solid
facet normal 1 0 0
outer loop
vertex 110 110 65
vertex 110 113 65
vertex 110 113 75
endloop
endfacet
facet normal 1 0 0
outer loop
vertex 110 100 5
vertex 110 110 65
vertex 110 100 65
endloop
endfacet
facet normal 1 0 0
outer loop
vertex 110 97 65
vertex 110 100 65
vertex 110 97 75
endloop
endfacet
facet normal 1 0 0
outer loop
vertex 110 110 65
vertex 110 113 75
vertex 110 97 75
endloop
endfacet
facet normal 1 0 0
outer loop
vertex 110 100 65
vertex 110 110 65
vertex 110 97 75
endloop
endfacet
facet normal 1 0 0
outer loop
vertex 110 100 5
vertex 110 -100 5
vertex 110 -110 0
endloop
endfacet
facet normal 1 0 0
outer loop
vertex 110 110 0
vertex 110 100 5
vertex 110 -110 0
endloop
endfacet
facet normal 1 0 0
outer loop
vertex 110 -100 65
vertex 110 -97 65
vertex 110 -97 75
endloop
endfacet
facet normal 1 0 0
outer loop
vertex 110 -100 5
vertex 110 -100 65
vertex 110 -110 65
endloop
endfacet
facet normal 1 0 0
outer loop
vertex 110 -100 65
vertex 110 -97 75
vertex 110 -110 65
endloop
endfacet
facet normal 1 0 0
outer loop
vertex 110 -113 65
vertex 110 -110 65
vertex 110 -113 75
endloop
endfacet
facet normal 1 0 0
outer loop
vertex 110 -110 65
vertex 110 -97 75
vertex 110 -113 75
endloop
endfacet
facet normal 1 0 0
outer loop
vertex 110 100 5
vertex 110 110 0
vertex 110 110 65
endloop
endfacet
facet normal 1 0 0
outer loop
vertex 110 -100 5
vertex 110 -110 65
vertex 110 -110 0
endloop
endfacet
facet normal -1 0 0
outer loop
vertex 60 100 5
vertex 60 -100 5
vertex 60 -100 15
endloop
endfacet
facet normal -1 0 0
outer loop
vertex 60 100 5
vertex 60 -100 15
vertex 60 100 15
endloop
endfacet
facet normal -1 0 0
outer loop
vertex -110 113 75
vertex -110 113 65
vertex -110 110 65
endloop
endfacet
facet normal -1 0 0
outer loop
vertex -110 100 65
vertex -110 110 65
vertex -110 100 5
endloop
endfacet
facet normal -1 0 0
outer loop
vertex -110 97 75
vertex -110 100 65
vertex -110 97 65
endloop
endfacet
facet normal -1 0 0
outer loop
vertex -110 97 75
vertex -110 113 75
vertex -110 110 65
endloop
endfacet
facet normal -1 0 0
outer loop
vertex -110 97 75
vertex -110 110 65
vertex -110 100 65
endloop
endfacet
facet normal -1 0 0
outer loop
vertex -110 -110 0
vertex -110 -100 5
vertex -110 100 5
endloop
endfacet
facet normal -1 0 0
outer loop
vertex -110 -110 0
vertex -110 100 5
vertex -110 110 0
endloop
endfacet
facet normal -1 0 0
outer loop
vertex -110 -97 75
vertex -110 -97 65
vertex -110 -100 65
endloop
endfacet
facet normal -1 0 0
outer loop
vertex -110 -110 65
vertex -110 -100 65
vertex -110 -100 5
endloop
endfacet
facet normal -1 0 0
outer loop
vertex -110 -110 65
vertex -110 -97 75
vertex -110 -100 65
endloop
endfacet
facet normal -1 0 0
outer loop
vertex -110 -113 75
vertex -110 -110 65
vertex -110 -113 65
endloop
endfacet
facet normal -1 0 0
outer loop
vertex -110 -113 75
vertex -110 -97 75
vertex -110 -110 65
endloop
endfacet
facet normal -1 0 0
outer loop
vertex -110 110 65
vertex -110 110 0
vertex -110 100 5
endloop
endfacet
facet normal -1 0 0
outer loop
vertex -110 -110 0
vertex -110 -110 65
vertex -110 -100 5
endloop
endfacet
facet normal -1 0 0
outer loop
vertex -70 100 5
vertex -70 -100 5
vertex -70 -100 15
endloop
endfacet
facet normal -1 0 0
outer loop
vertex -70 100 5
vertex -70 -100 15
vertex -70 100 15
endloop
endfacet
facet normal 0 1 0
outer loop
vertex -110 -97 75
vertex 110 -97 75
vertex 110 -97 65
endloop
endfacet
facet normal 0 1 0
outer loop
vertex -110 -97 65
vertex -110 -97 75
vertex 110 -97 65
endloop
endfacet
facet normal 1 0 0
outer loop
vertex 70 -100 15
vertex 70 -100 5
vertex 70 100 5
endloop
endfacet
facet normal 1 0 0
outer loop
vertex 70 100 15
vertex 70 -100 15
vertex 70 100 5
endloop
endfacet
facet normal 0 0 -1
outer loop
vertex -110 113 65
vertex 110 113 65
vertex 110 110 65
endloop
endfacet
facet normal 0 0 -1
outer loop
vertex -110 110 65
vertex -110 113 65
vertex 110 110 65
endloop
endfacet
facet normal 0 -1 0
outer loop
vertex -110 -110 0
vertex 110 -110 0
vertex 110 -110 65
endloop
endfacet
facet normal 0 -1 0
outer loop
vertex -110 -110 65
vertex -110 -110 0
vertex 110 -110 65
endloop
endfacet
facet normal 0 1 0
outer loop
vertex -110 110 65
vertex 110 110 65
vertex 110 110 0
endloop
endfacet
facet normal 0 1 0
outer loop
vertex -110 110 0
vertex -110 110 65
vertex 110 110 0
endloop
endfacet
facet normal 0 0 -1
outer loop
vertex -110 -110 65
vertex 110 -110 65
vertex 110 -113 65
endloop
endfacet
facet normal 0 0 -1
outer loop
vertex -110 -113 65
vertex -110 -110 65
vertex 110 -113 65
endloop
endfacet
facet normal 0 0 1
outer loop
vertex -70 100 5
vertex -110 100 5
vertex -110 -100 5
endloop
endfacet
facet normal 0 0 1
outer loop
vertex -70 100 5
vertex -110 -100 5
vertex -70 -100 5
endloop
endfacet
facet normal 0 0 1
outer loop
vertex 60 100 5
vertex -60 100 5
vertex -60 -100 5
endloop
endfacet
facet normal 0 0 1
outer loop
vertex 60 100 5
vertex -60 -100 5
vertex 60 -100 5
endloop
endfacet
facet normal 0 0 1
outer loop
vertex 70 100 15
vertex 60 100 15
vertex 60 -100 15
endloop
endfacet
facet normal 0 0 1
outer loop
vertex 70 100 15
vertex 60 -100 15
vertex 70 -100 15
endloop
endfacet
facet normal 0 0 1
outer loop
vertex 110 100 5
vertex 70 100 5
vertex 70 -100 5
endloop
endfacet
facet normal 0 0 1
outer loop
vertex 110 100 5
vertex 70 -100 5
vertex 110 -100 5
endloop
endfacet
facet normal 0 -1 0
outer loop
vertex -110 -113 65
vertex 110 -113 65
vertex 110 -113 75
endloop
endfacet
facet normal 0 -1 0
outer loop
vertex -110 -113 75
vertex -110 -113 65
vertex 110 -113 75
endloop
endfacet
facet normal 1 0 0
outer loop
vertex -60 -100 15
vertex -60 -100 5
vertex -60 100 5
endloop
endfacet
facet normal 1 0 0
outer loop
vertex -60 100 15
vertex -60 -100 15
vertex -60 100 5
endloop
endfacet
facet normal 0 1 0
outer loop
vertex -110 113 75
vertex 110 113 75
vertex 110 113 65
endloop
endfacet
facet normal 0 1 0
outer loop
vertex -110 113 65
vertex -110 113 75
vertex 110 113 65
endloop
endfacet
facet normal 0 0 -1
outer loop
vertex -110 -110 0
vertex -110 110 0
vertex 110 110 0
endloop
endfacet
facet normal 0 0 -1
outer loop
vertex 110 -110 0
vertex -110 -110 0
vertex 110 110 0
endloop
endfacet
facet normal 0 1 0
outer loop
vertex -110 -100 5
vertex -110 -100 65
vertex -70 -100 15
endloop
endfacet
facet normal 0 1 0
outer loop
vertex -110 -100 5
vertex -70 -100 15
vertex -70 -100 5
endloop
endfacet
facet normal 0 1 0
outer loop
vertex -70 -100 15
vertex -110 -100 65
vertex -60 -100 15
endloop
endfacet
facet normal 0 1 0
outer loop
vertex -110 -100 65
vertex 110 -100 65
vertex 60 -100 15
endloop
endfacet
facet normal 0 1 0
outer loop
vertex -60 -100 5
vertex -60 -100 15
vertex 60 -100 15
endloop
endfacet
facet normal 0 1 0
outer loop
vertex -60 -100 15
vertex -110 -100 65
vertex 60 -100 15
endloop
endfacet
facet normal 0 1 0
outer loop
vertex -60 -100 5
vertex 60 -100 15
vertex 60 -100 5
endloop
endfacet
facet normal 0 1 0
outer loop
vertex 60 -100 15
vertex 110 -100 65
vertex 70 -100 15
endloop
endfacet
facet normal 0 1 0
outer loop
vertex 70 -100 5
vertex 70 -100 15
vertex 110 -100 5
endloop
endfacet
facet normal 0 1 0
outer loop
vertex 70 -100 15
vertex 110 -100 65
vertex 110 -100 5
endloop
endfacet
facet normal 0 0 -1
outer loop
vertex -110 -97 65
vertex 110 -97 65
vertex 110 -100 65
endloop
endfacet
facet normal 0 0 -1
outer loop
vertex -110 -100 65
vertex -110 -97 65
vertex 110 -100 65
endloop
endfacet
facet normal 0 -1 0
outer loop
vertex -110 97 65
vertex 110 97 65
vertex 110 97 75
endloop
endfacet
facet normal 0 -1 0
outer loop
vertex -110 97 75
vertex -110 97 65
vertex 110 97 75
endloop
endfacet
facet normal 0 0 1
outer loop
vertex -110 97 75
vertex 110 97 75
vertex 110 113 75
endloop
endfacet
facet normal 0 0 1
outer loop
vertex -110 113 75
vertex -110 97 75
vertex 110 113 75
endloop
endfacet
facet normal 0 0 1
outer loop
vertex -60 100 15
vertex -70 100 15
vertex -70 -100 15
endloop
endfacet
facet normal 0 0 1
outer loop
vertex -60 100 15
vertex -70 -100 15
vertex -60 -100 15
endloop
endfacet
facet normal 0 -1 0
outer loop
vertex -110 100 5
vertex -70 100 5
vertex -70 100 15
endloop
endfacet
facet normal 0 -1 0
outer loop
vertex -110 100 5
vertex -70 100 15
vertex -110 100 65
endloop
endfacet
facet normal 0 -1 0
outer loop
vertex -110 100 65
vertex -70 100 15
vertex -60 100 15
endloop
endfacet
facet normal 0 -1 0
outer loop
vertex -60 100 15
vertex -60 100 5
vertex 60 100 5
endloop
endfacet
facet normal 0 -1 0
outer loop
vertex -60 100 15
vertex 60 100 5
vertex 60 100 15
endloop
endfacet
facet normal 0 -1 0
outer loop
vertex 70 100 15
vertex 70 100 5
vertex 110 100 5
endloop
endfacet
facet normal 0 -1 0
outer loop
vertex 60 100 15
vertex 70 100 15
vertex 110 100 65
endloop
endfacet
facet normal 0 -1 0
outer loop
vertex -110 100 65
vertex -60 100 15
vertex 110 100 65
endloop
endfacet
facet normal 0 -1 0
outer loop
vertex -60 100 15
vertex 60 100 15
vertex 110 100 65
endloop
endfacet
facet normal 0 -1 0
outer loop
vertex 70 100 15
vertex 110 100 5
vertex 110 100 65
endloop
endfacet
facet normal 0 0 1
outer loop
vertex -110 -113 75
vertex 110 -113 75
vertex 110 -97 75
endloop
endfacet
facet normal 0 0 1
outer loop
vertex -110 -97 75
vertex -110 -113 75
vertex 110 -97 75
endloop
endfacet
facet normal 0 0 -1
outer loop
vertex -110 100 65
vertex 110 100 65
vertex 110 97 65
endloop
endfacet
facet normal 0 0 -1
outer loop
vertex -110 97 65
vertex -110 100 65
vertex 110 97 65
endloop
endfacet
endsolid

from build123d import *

# Parameters (mm, degrees)
SKETCH_W            = 220
SKETCH_H            = 220
PAD_DEPTH           = 5
PAD001_DEPTH        = 220
LINEARPATTERN_COUNT = 2
LINEARPATTERN_PITCH = 210
SKETCH003_W         = 10
SKETCH003_H         = 200
PAD003_DEPTH        = 10


with BuildPart() as part:
    # Sketch → Pad (new body)
    with BuildSketch(Plane.XY):
        Rectangle(SKETCH_W, SKETCH_H)
    extrude(amount=PAD_DEPTH)

    # Sketch001 (on Face2 of Pad) → Pad001 (join)
    with BuildSketch(Plane.YZ.offset(110)):
        Polygon((-110, 5), (-110, 65), (-113, 65), (-113, 75), (-97, 75), (-97, 65), (-100, 65), (-100, 5), align=None)
    pad001 = extrude(amount=-PAD001_DEPTH)

    # LinearPattern: Pad001 ×2
    with Locations(*[(0, i * LINEARPATTERN_PITCH, 0) for i in range(1, LINEARPATTERN_COUNT)]):
        add(pad001)

    # Sketch003 (on Face7 of LinearPattern) → Pad003 (join)
    with BuildSketch(Plane.XY.offset(5)):
        with Locations((-65, 0)):
            Rectangle(SKETCH003_W, SKETCH003_H)
        with Locations((65, 0)):
            Rectangle(SKETCH003_W, SKETCH003_H)
    extrude(amount=PAD003_DEPTH)


solid = part.part
